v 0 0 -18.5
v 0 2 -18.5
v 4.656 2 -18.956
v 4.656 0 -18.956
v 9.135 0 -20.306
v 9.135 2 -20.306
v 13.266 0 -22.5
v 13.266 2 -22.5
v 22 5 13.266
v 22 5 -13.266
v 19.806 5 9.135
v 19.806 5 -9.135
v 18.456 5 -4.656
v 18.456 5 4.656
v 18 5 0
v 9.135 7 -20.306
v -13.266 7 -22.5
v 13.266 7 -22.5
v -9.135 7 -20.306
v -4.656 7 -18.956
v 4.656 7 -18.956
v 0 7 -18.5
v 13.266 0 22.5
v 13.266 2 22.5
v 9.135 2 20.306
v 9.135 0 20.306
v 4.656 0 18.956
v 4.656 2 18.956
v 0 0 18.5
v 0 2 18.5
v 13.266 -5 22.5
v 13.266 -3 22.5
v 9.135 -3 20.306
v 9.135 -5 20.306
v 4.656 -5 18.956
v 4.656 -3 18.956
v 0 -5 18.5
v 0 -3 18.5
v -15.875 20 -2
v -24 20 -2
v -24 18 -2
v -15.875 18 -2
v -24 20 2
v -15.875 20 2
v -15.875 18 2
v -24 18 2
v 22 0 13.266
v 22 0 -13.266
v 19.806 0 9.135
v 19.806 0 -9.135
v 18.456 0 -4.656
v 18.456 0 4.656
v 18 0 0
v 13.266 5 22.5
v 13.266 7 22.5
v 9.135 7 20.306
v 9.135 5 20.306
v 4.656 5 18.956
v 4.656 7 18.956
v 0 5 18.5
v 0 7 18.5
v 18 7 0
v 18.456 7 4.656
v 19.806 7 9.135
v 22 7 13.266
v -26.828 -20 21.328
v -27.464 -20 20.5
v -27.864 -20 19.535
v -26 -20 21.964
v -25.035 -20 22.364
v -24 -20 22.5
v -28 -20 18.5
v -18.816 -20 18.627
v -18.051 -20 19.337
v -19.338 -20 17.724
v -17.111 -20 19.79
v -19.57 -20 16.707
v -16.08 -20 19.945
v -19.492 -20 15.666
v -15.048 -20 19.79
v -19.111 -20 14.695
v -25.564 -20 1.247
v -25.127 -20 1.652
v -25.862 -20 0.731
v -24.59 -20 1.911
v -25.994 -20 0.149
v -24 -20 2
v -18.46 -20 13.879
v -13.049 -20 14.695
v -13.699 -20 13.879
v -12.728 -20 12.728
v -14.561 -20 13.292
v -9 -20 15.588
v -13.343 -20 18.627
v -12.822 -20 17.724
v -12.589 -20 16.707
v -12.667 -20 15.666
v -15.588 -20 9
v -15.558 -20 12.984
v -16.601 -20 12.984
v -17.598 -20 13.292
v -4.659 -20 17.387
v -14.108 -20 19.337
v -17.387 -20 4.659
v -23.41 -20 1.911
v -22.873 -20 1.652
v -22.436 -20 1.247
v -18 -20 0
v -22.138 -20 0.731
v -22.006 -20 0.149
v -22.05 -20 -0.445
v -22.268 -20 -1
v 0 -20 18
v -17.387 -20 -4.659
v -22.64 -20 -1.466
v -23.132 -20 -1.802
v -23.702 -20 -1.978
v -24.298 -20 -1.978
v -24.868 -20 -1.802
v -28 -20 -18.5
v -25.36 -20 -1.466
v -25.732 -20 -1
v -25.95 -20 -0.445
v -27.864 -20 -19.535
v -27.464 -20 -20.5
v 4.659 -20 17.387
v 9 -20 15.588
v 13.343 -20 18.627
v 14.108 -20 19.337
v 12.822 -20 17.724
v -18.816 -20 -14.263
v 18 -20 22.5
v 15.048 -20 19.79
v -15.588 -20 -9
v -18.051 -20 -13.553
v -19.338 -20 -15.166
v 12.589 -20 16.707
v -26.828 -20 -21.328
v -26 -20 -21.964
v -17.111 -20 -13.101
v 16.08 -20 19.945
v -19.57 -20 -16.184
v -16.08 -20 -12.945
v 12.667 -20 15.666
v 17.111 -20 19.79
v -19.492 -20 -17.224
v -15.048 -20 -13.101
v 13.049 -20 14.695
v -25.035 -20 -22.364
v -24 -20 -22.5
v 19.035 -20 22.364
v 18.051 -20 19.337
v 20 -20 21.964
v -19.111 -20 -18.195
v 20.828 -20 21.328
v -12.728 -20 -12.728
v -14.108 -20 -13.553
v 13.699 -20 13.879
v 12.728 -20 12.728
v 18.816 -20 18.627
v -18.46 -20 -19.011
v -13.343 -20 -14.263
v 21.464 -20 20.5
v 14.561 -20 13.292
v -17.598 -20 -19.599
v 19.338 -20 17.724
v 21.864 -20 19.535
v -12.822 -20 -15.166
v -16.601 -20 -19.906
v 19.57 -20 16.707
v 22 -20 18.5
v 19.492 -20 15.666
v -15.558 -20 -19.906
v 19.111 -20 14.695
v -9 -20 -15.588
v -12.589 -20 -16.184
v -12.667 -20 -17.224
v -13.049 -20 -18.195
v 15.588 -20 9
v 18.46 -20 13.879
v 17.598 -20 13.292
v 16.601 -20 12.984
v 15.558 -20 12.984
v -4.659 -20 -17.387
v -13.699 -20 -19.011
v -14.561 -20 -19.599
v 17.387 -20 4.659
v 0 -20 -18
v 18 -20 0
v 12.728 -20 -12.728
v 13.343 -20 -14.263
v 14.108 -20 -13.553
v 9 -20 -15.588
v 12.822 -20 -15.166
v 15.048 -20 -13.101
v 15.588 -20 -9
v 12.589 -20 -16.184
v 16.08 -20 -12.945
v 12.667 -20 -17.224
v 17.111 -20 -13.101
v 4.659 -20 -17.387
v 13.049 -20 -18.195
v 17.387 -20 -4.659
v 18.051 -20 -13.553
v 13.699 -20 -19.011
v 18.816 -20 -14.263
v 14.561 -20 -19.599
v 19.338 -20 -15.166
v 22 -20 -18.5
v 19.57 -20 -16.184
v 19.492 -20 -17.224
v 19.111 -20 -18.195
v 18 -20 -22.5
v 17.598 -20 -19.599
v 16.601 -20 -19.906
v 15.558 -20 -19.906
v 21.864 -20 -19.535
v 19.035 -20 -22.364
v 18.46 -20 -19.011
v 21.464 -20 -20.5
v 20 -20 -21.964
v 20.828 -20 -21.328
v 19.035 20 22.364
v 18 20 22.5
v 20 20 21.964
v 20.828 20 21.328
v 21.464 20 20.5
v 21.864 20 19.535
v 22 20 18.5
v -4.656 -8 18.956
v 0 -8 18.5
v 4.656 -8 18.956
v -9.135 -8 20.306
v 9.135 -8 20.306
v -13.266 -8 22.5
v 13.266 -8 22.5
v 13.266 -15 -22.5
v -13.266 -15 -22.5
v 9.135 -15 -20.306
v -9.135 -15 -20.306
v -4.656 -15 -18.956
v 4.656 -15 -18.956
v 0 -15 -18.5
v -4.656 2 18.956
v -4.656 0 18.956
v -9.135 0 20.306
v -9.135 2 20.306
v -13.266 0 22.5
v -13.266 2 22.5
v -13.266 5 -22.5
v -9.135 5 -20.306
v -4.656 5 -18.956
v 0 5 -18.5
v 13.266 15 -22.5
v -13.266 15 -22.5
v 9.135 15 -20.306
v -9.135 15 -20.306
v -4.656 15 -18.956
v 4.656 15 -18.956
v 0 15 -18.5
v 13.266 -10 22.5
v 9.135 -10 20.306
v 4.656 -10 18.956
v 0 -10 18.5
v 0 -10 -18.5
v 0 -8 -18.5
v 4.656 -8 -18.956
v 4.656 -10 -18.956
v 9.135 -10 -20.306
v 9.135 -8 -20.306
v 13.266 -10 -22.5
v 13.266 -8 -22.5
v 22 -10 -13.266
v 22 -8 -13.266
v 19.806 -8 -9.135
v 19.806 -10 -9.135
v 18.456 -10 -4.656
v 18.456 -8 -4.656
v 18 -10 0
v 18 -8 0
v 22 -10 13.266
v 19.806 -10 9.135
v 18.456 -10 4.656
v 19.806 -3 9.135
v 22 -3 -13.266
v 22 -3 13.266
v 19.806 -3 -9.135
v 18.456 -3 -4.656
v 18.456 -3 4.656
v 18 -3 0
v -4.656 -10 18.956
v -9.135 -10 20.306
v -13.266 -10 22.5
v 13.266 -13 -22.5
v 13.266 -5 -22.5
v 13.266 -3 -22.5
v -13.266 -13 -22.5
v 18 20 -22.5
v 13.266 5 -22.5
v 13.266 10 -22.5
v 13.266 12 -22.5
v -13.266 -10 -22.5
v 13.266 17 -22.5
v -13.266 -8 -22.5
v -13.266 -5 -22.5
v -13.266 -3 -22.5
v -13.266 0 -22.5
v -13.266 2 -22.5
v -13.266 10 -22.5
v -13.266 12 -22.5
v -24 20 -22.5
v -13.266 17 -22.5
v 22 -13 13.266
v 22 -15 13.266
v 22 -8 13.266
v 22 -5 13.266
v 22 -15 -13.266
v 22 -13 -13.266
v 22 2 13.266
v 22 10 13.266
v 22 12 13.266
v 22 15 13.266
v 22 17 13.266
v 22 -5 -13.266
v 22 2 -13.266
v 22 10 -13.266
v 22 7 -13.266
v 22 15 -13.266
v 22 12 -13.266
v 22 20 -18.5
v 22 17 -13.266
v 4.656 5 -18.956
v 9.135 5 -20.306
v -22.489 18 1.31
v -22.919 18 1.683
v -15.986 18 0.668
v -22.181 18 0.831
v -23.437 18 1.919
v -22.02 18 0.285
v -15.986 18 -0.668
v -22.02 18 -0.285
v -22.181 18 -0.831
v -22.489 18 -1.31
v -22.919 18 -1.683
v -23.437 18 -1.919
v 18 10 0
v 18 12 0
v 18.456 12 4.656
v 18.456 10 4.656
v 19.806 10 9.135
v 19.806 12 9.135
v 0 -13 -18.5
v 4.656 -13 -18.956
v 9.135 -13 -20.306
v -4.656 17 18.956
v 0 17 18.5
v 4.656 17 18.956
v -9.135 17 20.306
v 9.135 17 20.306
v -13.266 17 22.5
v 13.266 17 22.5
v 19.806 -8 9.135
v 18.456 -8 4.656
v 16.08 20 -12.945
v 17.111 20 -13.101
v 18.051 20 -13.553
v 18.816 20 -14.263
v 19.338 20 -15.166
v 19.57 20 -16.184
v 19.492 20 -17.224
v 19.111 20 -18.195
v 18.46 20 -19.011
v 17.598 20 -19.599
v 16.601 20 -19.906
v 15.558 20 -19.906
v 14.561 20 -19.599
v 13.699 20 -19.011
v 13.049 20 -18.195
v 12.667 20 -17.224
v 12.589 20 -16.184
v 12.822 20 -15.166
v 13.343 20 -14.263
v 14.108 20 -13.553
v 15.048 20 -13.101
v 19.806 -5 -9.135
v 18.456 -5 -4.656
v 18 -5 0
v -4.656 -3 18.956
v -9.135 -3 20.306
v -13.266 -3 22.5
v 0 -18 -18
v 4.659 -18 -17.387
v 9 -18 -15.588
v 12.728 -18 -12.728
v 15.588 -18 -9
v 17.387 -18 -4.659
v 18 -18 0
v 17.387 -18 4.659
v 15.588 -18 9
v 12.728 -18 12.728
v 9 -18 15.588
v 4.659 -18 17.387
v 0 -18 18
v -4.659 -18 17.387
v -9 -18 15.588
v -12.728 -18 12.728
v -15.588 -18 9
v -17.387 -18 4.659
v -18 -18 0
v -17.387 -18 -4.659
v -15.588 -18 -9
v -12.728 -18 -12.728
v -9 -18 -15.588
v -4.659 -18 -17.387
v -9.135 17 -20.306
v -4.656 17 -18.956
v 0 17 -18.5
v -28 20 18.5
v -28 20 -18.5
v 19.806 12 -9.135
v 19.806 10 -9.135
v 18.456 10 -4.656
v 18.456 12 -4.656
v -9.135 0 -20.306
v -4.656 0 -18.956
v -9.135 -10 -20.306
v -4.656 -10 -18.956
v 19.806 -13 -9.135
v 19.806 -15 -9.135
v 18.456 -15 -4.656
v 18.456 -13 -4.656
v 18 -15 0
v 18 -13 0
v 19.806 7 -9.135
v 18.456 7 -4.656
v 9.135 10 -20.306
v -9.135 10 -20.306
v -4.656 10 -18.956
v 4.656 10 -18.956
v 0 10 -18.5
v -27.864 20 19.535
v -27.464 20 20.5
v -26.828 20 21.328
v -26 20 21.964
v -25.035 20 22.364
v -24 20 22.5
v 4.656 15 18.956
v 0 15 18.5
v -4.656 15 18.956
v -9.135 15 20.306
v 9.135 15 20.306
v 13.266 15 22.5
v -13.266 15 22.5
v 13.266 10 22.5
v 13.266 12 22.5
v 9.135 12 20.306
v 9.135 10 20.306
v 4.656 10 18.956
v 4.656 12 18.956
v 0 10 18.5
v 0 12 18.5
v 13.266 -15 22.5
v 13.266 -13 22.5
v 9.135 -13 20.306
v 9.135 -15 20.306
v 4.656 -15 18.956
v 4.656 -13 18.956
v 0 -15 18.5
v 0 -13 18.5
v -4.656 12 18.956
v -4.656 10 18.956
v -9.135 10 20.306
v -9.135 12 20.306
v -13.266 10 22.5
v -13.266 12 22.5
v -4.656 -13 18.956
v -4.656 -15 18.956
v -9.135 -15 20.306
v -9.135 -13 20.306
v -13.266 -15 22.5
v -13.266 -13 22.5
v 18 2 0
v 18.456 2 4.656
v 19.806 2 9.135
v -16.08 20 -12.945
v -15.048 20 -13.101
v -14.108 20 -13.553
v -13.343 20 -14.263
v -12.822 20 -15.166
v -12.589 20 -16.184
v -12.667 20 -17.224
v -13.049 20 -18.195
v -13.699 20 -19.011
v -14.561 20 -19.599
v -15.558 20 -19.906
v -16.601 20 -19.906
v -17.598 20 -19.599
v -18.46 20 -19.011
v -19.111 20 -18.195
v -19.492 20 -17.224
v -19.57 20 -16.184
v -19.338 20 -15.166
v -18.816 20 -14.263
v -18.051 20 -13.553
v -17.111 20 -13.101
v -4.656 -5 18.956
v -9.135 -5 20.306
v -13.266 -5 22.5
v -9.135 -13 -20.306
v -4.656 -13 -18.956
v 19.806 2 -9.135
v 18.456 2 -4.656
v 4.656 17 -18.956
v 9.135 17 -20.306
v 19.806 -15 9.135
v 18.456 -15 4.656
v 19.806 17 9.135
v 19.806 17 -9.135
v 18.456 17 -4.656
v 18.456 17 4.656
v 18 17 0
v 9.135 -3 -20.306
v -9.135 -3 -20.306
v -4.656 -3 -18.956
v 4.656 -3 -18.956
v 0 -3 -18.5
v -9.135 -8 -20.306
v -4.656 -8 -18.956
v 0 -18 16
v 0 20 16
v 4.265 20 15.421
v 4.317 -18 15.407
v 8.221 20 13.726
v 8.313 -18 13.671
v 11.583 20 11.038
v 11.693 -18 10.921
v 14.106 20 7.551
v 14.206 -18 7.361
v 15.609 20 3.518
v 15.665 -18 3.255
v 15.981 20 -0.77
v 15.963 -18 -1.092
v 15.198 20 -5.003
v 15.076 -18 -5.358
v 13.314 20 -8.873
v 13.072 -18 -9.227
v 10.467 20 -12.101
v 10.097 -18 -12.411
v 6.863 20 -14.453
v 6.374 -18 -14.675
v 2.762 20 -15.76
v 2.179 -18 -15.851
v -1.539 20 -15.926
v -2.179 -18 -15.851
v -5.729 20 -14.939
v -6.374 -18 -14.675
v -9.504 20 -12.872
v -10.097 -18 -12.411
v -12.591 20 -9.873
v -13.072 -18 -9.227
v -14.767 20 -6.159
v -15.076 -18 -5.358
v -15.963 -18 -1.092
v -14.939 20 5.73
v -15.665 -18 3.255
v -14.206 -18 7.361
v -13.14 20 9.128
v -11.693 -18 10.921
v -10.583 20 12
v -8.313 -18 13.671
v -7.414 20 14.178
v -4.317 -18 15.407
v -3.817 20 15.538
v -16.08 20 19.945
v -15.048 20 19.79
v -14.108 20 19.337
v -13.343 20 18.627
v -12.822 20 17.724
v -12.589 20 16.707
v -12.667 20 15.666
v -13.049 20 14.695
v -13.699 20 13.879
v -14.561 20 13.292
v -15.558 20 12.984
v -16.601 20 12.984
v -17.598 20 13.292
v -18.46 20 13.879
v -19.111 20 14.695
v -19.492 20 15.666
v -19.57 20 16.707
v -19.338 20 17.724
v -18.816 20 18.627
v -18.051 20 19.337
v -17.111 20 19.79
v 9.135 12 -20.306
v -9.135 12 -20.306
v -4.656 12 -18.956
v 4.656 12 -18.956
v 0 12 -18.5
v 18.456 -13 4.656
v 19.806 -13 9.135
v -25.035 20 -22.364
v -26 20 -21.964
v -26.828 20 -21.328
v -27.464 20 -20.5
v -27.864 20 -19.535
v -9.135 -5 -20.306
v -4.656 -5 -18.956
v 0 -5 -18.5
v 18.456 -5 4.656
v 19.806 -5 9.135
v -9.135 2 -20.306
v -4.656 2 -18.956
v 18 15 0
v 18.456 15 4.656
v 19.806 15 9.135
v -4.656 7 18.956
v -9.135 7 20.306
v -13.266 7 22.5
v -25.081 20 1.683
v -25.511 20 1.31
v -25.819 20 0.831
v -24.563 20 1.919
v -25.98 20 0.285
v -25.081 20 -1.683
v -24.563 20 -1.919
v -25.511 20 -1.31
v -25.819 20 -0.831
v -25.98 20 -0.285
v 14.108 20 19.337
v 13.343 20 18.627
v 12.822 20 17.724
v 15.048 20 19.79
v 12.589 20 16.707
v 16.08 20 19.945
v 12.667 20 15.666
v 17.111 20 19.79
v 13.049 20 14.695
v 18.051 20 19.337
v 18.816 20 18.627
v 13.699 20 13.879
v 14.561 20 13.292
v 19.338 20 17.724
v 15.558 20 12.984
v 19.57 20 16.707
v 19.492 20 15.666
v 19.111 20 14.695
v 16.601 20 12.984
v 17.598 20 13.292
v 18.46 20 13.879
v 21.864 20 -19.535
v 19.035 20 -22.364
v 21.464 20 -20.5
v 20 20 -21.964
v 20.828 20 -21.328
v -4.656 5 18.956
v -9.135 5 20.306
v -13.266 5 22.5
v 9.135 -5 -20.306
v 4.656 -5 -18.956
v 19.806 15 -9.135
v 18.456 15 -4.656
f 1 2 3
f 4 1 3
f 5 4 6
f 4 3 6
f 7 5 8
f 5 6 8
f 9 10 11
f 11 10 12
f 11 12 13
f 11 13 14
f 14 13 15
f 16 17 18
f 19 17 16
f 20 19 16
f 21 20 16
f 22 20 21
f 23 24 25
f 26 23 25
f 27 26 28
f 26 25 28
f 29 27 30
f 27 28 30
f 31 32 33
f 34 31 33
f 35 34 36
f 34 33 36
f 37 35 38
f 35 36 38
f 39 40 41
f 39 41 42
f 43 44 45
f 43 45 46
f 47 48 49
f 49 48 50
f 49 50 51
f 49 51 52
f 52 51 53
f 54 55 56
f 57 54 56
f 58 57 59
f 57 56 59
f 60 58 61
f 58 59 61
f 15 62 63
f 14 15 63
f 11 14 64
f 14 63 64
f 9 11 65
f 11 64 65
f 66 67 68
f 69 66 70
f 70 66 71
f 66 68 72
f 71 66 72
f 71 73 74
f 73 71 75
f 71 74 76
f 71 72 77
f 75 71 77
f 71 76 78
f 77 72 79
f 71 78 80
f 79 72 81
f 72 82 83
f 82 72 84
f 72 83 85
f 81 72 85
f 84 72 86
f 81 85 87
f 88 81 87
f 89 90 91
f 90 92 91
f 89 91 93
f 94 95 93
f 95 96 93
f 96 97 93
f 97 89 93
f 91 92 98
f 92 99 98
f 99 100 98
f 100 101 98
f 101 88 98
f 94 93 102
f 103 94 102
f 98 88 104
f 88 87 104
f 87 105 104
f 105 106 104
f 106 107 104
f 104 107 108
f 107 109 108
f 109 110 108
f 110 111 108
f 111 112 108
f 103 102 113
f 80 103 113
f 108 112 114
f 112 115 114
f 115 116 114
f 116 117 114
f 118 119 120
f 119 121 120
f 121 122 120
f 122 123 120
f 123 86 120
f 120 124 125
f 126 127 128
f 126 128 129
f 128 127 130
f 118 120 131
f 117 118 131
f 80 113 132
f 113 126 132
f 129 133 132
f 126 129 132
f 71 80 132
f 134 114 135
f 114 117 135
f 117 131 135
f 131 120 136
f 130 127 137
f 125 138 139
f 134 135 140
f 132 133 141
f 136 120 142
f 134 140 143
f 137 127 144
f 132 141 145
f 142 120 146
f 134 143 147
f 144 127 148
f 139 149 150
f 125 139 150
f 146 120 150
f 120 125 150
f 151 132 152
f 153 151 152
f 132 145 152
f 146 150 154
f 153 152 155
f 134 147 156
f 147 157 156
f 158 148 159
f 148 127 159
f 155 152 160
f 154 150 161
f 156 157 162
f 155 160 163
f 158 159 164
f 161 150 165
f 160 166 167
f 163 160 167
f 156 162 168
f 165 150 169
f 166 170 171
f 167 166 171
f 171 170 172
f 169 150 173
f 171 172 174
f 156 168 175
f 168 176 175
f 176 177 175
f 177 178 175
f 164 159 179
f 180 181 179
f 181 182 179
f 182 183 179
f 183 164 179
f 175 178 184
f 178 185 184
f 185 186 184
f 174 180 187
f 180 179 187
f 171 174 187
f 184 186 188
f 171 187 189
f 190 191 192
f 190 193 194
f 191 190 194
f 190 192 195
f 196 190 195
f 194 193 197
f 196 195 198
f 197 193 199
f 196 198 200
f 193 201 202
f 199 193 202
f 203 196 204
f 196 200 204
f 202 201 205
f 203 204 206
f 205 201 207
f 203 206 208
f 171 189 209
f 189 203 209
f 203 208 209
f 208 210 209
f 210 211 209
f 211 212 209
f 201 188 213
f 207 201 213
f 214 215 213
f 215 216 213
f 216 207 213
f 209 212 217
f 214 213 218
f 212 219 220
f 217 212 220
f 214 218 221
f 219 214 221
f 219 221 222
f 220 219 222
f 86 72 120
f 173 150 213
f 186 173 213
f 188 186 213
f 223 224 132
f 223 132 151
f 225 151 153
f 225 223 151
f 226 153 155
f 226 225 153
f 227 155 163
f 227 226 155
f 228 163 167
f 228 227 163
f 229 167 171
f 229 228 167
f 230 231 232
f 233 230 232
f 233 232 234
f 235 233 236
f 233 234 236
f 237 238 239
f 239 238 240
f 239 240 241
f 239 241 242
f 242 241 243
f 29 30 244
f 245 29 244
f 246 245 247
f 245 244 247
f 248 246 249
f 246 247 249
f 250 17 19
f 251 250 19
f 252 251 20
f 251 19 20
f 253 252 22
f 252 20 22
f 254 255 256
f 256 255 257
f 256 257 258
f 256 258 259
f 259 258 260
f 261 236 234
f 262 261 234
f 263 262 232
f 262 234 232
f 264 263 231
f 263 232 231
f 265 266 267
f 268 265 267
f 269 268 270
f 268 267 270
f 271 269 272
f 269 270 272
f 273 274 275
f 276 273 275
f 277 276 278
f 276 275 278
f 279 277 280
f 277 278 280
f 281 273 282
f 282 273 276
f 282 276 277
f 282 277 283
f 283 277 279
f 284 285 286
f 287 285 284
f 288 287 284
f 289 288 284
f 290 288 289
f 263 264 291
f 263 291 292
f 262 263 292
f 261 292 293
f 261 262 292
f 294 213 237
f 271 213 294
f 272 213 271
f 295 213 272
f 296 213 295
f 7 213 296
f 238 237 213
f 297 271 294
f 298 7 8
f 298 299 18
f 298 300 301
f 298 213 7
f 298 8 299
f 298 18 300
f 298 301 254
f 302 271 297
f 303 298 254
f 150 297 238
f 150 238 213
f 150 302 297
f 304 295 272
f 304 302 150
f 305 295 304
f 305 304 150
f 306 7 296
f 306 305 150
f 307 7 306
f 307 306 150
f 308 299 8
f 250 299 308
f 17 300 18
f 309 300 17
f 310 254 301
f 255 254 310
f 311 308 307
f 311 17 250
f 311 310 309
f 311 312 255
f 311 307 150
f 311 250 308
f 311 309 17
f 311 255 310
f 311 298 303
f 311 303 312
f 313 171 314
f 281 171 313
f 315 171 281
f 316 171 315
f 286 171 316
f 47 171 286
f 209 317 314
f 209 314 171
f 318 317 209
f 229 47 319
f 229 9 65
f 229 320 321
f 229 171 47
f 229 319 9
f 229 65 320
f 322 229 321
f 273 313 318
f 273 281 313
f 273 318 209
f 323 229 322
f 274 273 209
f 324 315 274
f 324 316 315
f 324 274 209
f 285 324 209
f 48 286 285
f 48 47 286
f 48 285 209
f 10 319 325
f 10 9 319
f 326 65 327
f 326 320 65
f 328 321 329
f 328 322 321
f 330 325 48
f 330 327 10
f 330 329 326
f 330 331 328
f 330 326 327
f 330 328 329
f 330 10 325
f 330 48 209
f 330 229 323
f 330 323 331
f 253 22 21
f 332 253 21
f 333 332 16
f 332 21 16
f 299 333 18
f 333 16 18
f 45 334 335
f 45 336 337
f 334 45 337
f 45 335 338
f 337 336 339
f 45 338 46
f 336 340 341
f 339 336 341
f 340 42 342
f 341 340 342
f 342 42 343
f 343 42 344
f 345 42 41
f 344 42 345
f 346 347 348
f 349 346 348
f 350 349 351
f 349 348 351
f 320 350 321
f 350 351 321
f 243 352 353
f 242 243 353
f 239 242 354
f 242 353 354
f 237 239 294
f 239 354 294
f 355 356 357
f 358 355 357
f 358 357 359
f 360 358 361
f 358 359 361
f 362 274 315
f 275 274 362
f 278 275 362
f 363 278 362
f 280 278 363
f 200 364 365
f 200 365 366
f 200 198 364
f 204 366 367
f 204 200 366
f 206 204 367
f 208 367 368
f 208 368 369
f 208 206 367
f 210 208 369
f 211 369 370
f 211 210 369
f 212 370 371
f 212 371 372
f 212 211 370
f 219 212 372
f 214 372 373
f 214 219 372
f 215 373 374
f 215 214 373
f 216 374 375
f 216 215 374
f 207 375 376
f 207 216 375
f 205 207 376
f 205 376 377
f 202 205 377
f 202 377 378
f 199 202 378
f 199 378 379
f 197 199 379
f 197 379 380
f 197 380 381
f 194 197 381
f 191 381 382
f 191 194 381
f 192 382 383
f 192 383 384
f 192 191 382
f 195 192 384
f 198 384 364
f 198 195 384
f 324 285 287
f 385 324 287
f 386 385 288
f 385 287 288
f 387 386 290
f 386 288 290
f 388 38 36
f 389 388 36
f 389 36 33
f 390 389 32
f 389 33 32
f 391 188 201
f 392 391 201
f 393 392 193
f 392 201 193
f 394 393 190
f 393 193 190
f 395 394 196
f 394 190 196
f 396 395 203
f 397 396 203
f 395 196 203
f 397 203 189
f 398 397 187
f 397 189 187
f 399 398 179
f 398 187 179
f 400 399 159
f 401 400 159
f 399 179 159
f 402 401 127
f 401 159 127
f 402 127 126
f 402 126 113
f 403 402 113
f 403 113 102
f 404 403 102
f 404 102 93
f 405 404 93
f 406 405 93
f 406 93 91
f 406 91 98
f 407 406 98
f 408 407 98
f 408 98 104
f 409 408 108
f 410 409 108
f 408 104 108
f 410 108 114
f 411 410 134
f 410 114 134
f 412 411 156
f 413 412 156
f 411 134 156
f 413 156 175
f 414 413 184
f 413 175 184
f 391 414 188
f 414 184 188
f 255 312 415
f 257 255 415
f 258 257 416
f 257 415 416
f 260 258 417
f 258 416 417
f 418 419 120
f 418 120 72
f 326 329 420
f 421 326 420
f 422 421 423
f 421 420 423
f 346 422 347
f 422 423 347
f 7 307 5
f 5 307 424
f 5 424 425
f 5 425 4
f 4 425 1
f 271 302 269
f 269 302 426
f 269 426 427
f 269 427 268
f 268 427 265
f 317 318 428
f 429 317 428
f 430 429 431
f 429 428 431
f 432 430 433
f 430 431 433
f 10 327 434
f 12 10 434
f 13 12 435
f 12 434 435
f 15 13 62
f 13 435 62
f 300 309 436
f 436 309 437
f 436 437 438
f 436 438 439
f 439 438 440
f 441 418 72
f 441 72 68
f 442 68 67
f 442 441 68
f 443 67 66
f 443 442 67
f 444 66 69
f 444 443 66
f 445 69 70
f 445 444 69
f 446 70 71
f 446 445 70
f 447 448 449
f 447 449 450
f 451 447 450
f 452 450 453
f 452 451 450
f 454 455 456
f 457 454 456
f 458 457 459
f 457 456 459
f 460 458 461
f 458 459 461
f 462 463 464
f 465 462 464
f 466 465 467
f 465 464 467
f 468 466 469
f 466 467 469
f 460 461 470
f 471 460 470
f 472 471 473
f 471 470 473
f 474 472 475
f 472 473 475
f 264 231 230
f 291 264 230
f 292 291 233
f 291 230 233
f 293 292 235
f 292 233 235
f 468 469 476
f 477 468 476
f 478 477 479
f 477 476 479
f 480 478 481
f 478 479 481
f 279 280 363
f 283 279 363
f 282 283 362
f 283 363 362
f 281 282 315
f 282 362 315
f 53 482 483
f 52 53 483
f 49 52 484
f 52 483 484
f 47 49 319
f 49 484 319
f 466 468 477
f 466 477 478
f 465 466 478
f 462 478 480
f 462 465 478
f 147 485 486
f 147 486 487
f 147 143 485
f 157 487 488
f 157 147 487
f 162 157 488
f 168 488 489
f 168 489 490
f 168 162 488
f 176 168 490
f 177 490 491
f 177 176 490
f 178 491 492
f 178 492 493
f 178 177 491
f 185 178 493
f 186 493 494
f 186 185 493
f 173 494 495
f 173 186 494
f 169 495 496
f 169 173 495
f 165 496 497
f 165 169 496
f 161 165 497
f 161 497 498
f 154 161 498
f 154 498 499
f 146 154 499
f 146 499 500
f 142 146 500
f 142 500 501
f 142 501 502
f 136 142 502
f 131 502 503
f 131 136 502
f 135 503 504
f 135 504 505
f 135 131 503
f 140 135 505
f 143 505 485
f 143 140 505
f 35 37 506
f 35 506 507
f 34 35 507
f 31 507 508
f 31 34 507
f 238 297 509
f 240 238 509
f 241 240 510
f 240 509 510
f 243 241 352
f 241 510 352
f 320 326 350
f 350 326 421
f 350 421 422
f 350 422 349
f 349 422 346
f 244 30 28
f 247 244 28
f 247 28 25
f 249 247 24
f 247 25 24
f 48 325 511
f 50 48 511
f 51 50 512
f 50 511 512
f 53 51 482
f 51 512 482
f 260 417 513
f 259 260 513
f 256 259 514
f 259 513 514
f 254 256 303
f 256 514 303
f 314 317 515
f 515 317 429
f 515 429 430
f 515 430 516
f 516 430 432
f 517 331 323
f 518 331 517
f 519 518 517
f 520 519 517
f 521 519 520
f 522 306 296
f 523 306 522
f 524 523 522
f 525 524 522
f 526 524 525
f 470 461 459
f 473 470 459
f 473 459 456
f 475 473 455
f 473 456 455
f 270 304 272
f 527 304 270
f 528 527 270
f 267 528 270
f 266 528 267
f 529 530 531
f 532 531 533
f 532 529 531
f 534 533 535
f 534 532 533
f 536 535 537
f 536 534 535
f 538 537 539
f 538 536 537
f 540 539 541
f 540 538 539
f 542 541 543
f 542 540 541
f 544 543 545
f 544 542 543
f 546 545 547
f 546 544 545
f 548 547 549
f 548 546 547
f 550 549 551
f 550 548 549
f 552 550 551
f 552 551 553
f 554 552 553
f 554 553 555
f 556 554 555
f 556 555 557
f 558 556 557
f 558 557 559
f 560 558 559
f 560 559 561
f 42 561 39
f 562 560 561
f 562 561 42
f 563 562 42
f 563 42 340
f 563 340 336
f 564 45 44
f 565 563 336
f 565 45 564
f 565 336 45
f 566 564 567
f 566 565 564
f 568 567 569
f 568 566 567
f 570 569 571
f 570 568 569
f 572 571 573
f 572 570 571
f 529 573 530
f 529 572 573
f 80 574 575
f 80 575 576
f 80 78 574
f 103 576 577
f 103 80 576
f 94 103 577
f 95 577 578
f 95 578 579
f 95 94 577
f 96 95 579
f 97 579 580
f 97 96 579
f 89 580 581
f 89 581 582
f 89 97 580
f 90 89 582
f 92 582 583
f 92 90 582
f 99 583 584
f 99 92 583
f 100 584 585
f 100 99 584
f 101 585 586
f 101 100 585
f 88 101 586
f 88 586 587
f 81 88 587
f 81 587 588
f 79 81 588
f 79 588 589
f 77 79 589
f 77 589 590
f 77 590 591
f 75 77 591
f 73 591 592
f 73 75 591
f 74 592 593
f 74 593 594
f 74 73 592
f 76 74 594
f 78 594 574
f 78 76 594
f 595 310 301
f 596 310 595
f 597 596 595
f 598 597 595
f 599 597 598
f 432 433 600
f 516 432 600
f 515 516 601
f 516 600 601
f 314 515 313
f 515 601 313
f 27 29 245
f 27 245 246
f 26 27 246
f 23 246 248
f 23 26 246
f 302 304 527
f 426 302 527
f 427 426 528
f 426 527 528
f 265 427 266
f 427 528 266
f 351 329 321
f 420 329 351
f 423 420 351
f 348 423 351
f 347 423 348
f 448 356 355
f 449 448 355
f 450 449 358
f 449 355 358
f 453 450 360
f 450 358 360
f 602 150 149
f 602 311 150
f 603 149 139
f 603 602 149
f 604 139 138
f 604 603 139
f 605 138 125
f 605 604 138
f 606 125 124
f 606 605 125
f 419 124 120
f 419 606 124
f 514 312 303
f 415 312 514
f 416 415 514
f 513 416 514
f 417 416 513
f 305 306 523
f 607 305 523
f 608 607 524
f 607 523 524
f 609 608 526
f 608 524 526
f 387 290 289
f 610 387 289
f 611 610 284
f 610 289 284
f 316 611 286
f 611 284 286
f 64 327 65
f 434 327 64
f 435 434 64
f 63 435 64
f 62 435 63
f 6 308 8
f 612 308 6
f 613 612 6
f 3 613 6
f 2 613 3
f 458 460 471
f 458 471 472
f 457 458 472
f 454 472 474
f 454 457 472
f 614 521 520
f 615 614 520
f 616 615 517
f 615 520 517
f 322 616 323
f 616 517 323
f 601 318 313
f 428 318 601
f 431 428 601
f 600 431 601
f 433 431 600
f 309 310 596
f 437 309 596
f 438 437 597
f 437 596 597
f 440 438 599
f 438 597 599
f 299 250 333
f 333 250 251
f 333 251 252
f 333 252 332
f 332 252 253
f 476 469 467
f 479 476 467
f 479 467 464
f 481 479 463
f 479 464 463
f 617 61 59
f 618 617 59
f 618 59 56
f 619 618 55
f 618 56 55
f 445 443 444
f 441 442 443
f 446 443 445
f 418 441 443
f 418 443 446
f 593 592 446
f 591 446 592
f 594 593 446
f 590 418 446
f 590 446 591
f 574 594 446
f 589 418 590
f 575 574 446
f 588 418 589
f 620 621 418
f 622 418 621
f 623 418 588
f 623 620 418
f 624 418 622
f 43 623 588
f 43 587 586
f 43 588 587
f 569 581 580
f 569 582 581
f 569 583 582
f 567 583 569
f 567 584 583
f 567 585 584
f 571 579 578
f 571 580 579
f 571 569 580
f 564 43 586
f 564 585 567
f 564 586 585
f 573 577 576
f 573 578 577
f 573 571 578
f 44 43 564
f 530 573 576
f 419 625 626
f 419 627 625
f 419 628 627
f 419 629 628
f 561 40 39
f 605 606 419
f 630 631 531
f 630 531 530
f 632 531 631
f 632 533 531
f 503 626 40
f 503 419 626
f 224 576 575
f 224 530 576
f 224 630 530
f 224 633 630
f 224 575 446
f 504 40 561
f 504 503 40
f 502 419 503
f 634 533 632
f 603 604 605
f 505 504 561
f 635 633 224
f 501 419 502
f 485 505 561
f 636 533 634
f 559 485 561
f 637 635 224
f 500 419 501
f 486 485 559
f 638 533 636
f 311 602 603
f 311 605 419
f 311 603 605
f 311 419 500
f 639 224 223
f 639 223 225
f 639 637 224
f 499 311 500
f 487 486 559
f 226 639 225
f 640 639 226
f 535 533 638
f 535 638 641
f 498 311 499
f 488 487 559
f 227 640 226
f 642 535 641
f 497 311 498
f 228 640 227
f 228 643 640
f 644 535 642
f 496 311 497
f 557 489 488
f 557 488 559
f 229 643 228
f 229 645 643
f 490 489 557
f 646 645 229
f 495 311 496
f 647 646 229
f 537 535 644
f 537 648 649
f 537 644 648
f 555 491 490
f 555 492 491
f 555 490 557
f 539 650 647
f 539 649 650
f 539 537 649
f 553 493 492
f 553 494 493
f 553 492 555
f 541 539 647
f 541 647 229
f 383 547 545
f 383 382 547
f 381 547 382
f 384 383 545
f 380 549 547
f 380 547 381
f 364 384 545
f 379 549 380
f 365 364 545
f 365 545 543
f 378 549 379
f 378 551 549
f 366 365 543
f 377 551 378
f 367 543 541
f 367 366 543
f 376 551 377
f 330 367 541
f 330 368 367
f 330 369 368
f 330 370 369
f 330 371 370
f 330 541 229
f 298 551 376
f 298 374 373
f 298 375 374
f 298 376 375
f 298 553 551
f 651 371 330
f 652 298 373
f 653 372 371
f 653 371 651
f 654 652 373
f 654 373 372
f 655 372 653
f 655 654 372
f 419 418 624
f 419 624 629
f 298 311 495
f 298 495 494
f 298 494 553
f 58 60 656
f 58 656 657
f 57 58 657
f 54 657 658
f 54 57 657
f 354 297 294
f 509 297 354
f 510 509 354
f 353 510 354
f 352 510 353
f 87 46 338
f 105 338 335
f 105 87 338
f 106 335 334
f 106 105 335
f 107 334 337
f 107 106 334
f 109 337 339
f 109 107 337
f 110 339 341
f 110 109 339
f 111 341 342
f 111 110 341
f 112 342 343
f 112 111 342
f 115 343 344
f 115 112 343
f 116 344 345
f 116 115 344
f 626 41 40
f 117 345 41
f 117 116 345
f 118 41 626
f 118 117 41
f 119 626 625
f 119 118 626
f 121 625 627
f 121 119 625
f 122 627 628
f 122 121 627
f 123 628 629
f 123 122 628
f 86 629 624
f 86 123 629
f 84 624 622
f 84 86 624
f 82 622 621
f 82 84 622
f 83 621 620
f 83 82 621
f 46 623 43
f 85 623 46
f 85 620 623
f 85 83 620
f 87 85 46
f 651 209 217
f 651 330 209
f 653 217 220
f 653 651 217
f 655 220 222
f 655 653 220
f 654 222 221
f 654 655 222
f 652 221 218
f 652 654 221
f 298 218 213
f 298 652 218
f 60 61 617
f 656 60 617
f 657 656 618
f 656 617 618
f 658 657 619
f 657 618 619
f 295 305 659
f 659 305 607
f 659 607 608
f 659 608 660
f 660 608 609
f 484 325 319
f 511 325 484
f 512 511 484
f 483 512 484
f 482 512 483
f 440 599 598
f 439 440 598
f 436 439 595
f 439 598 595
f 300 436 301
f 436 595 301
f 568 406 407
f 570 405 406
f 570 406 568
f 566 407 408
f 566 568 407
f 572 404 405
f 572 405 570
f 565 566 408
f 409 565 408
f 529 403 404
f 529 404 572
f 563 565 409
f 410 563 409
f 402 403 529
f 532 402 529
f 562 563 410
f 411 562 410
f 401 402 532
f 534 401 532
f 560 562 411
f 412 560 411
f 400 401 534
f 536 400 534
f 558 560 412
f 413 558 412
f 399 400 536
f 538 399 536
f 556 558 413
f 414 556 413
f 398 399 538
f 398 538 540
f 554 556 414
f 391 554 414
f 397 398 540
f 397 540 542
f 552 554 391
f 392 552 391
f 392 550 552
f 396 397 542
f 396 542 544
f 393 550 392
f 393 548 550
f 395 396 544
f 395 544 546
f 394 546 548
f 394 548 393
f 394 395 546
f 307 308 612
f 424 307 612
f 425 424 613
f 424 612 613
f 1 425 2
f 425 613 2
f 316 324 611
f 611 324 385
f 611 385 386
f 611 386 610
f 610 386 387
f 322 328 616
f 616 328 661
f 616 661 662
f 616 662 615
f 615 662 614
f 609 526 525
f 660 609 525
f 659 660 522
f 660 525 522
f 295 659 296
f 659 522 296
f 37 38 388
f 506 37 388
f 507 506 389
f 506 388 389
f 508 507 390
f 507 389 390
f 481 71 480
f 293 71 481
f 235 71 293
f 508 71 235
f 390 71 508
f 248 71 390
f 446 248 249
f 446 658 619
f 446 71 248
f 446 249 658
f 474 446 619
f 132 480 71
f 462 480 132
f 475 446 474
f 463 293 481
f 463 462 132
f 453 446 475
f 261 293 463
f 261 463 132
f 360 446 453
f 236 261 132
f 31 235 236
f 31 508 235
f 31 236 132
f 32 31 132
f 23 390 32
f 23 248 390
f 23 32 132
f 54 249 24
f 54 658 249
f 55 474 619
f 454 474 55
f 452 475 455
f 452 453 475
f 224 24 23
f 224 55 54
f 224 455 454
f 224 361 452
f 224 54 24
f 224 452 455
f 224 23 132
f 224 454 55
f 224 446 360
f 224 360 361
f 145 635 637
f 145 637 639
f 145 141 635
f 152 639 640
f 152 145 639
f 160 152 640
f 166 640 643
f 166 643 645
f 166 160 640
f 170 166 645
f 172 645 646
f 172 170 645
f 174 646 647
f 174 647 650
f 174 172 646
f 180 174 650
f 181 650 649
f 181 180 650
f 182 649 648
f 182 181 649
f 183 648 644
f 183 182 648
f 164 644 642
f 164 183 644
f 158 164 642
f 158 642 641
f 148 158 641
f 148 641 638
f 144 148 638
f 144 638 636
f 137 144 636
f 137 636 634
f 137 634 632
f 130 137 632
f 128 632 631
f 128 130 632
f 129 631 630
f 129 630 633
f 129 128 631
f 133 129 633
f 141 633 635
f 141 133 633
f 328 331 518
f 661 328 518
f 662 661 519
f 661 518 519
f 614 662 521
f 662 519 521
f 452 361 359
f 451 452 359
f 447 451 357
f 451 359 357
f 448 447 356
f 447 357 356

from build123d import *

# Parameters (mm, degrees)
SKETCH1_R           = 2
SKETCH1_R_2         = 3.5
SKETCH1_R_3         = 16
BOSS_EXTRUDE1_DEPTH = 20
CUT_EXTRUDE1_DEPTH  = 2
CUT_EXTRUDE2_START  = -3
CUT_EXTRUDE2_DEPTH  = 2
LPATTERN1_COUNT     = 7
LPATTERN1_PITCH     = 5
SKETCH2_R           = 18
SKETCH2_R_2         = 16
CUT_EXTRUDE3_DEPTH  = 2


with BuildPart() as part:
    # Sketch1 → Boss-Extrude1 (new, symmetric)
    with BuildSketch(Plane(origin=(0, 0, 0), x_dir=(1, 0, 0), z_dir=(0, 1, 0))):
        with BuildLine():
            Line((-22, 22.5), (-24, 22.5))
            ThreePointArc((-24, 22.5), (-26.828427125, 21.328427125), (-28, 18.5))
            Line((-28, 18.5), (-28, -18.5))
            ThreePointArc((-28, -18.5), (-26.828427125, -21.328427125), (-24, -22.5))
            Line((-24, -22.5), (-22, -22.5))
            Line((-22, -22.5), (18, -22.5))
            ThreePointArc((18, -22.5), (20.828427125, -21.328427125), (22, -18.5))
            Line((22, -18.5), (22, 18.5))
            ThreePointArc((22, 18.5), (20.828427125, 21.328427125), (18, 22.5))
            Line((18, 22.5), (-22, 22.5))
        make_face()
        with Locations(Location((-24, 0, 0), (0, 0, 270))):
            Circle(SKETCH1_R, mode=Mode.SUBTRACT)
        with Locations(Location((16.079705534, 16.445153387, 0), (0, 0, 270))):
            Circle(SKETCH1_R_2, mode=Mode.SUBTRACT)
        with Locations(Location((-16.079705534, 16.445153387, 0), (0, 0, 270))):
            Circle(SKETCH1_R_2, mode=Mode.SUBTRACT)
        with Locations(Location((-16.079705534, -16.445153387, 0), (0, 0, 270))):
            Circle(SKETCH1_R_2, mode=Mode.SUBTRACT)
        with Locations(Location((16.079705534, -16.445153387, 0), (0, 0, 270))):
            Circle(SKETCH1_R_2, mode=Mode.SUBTRACT)
        with Locations(Location((0, 0, 0), (0, 0, 270))):
            Circle(SKETCH1_R_3, mode=Mode.SUBTRACT)
    extrude(amount=BOSS_EXTRUDE1_DEPTH, both=True)

    # Sketch3 → Cut-Extrude1 (cut)
    with BuildSketch(Plane(origin=(0, 20, 0), x_dir=(1, 0, 0), z_dir=(0, 1, 0))):
        with BuildLine():
            Line((-24, 2), (-15.874507866, 2))
            ThreePointArc((-15.874507866, 2), (-16, 0), (-15.874507866, -2))
            Line((-15.874507866, -2), (-24, -2))
            ThreePointArc((-24, -2), (-22, 0), (-24, 2))
        make_face()
    extrude(amount=-CUT_EXTRUDE1_DEPTH, mode=Mode.SUBTRACT)

    # Sketch5 → Cut-Extrude2 (cut)
    with BuildSketch(Plane(origin=(0, 20, 0), x_dir=(1, 0, 0), z_dir=(0, 1, 0)).offset(CUT_EXTRUDE2_START)):
        with BuildLine():
            ThreePointArc((13.266499161, -22.5), (6.92820323, -19.521749414), (0, -18.5))
            Line((0, -18.5), (0, -22.5))
            Line((0, -22.5), (13.266499161, -22.5))
        make_face()
        with BuildLine():
            Line((0, -22.5), (0, -18.5))
            ThreePointArc((0, -18.5), (-6.92820323, -19.521749414), (-13.266499161, -22.5))
            Line((-13.266499161, -22.5), (0, -22.5))
        make_face()
        with BuildLine():
            Line((13.266499161, -22.5), (0, -22.5))
            Line((0, -22.5), (-13.266499161, -22.5))
            ThreePointArc((-13.266499161, -22.5), (-11.349097324, -63.647056295), (24, -42.5))
            ThreePointArc((24, -42.5), (21.147056295, -31.150902676), (13.266499161, -22.5))
        make_face()
        with BuildLine():
            ThreePointArc((18, 0), (19.021749414, -6.92820323), (22, -13.266499161))
            Line((22, -13.266499161), (22, 0))
            Line((22, 0), (18, 0))
        make_face()
        with BuildLine():
            Line((22, 0), (22, -13.266499161))
            ThreePointArc((22, -13.266499161), (48.92820323, -22.978250586), (66, 0))
            ThreePointArc((66, 0), (48.92820323, 22.978250586), (22, 13.266499161))
            Line((22, 13.266499161), (22, 0))
        make_face()
        with BuildLine():
            Line((18, 0), (22, 0))
            Line((22, 0), (22, 13.266499161))
            ThreePointArc((22, 13.266499161), (19.021749414, 6.92820323), (18, 0))
        make_face()
        with BuildLine():
            ThreePointArc((24, 42.5), (-11.349097324, 63.647056295), (-13.266499161, 22.5))
            Line((-13.266499161, 22.5), (0, 22.5))
            Line((0, 22.5), (13.266499161, 22.5))
            ThreePointArc((13.266499161, 22.5), (21.147056295, 31.150902676), (24, 42.5))
        make_face()
        with BuildLine():
            Line((0, 22.5), (-13.266499161, 22.5))
            ThreePointArc((-13.266499161, 22.5), (-6.92820323, 19.521749414), (0, 18.5))
            Line((0, 18.5), (0, 22.5))
        make_face()
        with BuildLine():
            Line((13.266499161, 22.5), (0, 22.5))
            Line((0, 22.5), (0, 18.5))
            ThreePointArc((0, 18.5), (6.92820323, 19.521749414), (13.266499161, 22.5))
        make_face()
    cut_extrude2 = extrude(amount=-CUT_EXTRUDE2_DEPTH, mode=Mode.SUBTRACT)

    # LPattern1: Cut-Extrude2 ×7
    with Locations(*[(0, -i * LPATTERN1_PITCH, 0) for i in range(1, LPATTERN1_COUNT)]):
        add(cut_extrude2, mode=Mode.SUBTRACT)

    # Sketch2 → Cut-Extrude3 (cut)
    with BuildSketch(Plane.XZ.offset(20)):
        with Locations(Location((0, 0, 0), (0, 0, 270))):
            Circle(SKETCH2_R)
        with Locations(Location((0, 0, 0), (0, 0, 270))):
            Circle(SKETCH2_R_2, mode=Mode.SUBTRACT)
    extrude(amount=-CUT_EXTRUDE3_DEPTH, mode=Mode.SUBTRACT)


solid = part.part
